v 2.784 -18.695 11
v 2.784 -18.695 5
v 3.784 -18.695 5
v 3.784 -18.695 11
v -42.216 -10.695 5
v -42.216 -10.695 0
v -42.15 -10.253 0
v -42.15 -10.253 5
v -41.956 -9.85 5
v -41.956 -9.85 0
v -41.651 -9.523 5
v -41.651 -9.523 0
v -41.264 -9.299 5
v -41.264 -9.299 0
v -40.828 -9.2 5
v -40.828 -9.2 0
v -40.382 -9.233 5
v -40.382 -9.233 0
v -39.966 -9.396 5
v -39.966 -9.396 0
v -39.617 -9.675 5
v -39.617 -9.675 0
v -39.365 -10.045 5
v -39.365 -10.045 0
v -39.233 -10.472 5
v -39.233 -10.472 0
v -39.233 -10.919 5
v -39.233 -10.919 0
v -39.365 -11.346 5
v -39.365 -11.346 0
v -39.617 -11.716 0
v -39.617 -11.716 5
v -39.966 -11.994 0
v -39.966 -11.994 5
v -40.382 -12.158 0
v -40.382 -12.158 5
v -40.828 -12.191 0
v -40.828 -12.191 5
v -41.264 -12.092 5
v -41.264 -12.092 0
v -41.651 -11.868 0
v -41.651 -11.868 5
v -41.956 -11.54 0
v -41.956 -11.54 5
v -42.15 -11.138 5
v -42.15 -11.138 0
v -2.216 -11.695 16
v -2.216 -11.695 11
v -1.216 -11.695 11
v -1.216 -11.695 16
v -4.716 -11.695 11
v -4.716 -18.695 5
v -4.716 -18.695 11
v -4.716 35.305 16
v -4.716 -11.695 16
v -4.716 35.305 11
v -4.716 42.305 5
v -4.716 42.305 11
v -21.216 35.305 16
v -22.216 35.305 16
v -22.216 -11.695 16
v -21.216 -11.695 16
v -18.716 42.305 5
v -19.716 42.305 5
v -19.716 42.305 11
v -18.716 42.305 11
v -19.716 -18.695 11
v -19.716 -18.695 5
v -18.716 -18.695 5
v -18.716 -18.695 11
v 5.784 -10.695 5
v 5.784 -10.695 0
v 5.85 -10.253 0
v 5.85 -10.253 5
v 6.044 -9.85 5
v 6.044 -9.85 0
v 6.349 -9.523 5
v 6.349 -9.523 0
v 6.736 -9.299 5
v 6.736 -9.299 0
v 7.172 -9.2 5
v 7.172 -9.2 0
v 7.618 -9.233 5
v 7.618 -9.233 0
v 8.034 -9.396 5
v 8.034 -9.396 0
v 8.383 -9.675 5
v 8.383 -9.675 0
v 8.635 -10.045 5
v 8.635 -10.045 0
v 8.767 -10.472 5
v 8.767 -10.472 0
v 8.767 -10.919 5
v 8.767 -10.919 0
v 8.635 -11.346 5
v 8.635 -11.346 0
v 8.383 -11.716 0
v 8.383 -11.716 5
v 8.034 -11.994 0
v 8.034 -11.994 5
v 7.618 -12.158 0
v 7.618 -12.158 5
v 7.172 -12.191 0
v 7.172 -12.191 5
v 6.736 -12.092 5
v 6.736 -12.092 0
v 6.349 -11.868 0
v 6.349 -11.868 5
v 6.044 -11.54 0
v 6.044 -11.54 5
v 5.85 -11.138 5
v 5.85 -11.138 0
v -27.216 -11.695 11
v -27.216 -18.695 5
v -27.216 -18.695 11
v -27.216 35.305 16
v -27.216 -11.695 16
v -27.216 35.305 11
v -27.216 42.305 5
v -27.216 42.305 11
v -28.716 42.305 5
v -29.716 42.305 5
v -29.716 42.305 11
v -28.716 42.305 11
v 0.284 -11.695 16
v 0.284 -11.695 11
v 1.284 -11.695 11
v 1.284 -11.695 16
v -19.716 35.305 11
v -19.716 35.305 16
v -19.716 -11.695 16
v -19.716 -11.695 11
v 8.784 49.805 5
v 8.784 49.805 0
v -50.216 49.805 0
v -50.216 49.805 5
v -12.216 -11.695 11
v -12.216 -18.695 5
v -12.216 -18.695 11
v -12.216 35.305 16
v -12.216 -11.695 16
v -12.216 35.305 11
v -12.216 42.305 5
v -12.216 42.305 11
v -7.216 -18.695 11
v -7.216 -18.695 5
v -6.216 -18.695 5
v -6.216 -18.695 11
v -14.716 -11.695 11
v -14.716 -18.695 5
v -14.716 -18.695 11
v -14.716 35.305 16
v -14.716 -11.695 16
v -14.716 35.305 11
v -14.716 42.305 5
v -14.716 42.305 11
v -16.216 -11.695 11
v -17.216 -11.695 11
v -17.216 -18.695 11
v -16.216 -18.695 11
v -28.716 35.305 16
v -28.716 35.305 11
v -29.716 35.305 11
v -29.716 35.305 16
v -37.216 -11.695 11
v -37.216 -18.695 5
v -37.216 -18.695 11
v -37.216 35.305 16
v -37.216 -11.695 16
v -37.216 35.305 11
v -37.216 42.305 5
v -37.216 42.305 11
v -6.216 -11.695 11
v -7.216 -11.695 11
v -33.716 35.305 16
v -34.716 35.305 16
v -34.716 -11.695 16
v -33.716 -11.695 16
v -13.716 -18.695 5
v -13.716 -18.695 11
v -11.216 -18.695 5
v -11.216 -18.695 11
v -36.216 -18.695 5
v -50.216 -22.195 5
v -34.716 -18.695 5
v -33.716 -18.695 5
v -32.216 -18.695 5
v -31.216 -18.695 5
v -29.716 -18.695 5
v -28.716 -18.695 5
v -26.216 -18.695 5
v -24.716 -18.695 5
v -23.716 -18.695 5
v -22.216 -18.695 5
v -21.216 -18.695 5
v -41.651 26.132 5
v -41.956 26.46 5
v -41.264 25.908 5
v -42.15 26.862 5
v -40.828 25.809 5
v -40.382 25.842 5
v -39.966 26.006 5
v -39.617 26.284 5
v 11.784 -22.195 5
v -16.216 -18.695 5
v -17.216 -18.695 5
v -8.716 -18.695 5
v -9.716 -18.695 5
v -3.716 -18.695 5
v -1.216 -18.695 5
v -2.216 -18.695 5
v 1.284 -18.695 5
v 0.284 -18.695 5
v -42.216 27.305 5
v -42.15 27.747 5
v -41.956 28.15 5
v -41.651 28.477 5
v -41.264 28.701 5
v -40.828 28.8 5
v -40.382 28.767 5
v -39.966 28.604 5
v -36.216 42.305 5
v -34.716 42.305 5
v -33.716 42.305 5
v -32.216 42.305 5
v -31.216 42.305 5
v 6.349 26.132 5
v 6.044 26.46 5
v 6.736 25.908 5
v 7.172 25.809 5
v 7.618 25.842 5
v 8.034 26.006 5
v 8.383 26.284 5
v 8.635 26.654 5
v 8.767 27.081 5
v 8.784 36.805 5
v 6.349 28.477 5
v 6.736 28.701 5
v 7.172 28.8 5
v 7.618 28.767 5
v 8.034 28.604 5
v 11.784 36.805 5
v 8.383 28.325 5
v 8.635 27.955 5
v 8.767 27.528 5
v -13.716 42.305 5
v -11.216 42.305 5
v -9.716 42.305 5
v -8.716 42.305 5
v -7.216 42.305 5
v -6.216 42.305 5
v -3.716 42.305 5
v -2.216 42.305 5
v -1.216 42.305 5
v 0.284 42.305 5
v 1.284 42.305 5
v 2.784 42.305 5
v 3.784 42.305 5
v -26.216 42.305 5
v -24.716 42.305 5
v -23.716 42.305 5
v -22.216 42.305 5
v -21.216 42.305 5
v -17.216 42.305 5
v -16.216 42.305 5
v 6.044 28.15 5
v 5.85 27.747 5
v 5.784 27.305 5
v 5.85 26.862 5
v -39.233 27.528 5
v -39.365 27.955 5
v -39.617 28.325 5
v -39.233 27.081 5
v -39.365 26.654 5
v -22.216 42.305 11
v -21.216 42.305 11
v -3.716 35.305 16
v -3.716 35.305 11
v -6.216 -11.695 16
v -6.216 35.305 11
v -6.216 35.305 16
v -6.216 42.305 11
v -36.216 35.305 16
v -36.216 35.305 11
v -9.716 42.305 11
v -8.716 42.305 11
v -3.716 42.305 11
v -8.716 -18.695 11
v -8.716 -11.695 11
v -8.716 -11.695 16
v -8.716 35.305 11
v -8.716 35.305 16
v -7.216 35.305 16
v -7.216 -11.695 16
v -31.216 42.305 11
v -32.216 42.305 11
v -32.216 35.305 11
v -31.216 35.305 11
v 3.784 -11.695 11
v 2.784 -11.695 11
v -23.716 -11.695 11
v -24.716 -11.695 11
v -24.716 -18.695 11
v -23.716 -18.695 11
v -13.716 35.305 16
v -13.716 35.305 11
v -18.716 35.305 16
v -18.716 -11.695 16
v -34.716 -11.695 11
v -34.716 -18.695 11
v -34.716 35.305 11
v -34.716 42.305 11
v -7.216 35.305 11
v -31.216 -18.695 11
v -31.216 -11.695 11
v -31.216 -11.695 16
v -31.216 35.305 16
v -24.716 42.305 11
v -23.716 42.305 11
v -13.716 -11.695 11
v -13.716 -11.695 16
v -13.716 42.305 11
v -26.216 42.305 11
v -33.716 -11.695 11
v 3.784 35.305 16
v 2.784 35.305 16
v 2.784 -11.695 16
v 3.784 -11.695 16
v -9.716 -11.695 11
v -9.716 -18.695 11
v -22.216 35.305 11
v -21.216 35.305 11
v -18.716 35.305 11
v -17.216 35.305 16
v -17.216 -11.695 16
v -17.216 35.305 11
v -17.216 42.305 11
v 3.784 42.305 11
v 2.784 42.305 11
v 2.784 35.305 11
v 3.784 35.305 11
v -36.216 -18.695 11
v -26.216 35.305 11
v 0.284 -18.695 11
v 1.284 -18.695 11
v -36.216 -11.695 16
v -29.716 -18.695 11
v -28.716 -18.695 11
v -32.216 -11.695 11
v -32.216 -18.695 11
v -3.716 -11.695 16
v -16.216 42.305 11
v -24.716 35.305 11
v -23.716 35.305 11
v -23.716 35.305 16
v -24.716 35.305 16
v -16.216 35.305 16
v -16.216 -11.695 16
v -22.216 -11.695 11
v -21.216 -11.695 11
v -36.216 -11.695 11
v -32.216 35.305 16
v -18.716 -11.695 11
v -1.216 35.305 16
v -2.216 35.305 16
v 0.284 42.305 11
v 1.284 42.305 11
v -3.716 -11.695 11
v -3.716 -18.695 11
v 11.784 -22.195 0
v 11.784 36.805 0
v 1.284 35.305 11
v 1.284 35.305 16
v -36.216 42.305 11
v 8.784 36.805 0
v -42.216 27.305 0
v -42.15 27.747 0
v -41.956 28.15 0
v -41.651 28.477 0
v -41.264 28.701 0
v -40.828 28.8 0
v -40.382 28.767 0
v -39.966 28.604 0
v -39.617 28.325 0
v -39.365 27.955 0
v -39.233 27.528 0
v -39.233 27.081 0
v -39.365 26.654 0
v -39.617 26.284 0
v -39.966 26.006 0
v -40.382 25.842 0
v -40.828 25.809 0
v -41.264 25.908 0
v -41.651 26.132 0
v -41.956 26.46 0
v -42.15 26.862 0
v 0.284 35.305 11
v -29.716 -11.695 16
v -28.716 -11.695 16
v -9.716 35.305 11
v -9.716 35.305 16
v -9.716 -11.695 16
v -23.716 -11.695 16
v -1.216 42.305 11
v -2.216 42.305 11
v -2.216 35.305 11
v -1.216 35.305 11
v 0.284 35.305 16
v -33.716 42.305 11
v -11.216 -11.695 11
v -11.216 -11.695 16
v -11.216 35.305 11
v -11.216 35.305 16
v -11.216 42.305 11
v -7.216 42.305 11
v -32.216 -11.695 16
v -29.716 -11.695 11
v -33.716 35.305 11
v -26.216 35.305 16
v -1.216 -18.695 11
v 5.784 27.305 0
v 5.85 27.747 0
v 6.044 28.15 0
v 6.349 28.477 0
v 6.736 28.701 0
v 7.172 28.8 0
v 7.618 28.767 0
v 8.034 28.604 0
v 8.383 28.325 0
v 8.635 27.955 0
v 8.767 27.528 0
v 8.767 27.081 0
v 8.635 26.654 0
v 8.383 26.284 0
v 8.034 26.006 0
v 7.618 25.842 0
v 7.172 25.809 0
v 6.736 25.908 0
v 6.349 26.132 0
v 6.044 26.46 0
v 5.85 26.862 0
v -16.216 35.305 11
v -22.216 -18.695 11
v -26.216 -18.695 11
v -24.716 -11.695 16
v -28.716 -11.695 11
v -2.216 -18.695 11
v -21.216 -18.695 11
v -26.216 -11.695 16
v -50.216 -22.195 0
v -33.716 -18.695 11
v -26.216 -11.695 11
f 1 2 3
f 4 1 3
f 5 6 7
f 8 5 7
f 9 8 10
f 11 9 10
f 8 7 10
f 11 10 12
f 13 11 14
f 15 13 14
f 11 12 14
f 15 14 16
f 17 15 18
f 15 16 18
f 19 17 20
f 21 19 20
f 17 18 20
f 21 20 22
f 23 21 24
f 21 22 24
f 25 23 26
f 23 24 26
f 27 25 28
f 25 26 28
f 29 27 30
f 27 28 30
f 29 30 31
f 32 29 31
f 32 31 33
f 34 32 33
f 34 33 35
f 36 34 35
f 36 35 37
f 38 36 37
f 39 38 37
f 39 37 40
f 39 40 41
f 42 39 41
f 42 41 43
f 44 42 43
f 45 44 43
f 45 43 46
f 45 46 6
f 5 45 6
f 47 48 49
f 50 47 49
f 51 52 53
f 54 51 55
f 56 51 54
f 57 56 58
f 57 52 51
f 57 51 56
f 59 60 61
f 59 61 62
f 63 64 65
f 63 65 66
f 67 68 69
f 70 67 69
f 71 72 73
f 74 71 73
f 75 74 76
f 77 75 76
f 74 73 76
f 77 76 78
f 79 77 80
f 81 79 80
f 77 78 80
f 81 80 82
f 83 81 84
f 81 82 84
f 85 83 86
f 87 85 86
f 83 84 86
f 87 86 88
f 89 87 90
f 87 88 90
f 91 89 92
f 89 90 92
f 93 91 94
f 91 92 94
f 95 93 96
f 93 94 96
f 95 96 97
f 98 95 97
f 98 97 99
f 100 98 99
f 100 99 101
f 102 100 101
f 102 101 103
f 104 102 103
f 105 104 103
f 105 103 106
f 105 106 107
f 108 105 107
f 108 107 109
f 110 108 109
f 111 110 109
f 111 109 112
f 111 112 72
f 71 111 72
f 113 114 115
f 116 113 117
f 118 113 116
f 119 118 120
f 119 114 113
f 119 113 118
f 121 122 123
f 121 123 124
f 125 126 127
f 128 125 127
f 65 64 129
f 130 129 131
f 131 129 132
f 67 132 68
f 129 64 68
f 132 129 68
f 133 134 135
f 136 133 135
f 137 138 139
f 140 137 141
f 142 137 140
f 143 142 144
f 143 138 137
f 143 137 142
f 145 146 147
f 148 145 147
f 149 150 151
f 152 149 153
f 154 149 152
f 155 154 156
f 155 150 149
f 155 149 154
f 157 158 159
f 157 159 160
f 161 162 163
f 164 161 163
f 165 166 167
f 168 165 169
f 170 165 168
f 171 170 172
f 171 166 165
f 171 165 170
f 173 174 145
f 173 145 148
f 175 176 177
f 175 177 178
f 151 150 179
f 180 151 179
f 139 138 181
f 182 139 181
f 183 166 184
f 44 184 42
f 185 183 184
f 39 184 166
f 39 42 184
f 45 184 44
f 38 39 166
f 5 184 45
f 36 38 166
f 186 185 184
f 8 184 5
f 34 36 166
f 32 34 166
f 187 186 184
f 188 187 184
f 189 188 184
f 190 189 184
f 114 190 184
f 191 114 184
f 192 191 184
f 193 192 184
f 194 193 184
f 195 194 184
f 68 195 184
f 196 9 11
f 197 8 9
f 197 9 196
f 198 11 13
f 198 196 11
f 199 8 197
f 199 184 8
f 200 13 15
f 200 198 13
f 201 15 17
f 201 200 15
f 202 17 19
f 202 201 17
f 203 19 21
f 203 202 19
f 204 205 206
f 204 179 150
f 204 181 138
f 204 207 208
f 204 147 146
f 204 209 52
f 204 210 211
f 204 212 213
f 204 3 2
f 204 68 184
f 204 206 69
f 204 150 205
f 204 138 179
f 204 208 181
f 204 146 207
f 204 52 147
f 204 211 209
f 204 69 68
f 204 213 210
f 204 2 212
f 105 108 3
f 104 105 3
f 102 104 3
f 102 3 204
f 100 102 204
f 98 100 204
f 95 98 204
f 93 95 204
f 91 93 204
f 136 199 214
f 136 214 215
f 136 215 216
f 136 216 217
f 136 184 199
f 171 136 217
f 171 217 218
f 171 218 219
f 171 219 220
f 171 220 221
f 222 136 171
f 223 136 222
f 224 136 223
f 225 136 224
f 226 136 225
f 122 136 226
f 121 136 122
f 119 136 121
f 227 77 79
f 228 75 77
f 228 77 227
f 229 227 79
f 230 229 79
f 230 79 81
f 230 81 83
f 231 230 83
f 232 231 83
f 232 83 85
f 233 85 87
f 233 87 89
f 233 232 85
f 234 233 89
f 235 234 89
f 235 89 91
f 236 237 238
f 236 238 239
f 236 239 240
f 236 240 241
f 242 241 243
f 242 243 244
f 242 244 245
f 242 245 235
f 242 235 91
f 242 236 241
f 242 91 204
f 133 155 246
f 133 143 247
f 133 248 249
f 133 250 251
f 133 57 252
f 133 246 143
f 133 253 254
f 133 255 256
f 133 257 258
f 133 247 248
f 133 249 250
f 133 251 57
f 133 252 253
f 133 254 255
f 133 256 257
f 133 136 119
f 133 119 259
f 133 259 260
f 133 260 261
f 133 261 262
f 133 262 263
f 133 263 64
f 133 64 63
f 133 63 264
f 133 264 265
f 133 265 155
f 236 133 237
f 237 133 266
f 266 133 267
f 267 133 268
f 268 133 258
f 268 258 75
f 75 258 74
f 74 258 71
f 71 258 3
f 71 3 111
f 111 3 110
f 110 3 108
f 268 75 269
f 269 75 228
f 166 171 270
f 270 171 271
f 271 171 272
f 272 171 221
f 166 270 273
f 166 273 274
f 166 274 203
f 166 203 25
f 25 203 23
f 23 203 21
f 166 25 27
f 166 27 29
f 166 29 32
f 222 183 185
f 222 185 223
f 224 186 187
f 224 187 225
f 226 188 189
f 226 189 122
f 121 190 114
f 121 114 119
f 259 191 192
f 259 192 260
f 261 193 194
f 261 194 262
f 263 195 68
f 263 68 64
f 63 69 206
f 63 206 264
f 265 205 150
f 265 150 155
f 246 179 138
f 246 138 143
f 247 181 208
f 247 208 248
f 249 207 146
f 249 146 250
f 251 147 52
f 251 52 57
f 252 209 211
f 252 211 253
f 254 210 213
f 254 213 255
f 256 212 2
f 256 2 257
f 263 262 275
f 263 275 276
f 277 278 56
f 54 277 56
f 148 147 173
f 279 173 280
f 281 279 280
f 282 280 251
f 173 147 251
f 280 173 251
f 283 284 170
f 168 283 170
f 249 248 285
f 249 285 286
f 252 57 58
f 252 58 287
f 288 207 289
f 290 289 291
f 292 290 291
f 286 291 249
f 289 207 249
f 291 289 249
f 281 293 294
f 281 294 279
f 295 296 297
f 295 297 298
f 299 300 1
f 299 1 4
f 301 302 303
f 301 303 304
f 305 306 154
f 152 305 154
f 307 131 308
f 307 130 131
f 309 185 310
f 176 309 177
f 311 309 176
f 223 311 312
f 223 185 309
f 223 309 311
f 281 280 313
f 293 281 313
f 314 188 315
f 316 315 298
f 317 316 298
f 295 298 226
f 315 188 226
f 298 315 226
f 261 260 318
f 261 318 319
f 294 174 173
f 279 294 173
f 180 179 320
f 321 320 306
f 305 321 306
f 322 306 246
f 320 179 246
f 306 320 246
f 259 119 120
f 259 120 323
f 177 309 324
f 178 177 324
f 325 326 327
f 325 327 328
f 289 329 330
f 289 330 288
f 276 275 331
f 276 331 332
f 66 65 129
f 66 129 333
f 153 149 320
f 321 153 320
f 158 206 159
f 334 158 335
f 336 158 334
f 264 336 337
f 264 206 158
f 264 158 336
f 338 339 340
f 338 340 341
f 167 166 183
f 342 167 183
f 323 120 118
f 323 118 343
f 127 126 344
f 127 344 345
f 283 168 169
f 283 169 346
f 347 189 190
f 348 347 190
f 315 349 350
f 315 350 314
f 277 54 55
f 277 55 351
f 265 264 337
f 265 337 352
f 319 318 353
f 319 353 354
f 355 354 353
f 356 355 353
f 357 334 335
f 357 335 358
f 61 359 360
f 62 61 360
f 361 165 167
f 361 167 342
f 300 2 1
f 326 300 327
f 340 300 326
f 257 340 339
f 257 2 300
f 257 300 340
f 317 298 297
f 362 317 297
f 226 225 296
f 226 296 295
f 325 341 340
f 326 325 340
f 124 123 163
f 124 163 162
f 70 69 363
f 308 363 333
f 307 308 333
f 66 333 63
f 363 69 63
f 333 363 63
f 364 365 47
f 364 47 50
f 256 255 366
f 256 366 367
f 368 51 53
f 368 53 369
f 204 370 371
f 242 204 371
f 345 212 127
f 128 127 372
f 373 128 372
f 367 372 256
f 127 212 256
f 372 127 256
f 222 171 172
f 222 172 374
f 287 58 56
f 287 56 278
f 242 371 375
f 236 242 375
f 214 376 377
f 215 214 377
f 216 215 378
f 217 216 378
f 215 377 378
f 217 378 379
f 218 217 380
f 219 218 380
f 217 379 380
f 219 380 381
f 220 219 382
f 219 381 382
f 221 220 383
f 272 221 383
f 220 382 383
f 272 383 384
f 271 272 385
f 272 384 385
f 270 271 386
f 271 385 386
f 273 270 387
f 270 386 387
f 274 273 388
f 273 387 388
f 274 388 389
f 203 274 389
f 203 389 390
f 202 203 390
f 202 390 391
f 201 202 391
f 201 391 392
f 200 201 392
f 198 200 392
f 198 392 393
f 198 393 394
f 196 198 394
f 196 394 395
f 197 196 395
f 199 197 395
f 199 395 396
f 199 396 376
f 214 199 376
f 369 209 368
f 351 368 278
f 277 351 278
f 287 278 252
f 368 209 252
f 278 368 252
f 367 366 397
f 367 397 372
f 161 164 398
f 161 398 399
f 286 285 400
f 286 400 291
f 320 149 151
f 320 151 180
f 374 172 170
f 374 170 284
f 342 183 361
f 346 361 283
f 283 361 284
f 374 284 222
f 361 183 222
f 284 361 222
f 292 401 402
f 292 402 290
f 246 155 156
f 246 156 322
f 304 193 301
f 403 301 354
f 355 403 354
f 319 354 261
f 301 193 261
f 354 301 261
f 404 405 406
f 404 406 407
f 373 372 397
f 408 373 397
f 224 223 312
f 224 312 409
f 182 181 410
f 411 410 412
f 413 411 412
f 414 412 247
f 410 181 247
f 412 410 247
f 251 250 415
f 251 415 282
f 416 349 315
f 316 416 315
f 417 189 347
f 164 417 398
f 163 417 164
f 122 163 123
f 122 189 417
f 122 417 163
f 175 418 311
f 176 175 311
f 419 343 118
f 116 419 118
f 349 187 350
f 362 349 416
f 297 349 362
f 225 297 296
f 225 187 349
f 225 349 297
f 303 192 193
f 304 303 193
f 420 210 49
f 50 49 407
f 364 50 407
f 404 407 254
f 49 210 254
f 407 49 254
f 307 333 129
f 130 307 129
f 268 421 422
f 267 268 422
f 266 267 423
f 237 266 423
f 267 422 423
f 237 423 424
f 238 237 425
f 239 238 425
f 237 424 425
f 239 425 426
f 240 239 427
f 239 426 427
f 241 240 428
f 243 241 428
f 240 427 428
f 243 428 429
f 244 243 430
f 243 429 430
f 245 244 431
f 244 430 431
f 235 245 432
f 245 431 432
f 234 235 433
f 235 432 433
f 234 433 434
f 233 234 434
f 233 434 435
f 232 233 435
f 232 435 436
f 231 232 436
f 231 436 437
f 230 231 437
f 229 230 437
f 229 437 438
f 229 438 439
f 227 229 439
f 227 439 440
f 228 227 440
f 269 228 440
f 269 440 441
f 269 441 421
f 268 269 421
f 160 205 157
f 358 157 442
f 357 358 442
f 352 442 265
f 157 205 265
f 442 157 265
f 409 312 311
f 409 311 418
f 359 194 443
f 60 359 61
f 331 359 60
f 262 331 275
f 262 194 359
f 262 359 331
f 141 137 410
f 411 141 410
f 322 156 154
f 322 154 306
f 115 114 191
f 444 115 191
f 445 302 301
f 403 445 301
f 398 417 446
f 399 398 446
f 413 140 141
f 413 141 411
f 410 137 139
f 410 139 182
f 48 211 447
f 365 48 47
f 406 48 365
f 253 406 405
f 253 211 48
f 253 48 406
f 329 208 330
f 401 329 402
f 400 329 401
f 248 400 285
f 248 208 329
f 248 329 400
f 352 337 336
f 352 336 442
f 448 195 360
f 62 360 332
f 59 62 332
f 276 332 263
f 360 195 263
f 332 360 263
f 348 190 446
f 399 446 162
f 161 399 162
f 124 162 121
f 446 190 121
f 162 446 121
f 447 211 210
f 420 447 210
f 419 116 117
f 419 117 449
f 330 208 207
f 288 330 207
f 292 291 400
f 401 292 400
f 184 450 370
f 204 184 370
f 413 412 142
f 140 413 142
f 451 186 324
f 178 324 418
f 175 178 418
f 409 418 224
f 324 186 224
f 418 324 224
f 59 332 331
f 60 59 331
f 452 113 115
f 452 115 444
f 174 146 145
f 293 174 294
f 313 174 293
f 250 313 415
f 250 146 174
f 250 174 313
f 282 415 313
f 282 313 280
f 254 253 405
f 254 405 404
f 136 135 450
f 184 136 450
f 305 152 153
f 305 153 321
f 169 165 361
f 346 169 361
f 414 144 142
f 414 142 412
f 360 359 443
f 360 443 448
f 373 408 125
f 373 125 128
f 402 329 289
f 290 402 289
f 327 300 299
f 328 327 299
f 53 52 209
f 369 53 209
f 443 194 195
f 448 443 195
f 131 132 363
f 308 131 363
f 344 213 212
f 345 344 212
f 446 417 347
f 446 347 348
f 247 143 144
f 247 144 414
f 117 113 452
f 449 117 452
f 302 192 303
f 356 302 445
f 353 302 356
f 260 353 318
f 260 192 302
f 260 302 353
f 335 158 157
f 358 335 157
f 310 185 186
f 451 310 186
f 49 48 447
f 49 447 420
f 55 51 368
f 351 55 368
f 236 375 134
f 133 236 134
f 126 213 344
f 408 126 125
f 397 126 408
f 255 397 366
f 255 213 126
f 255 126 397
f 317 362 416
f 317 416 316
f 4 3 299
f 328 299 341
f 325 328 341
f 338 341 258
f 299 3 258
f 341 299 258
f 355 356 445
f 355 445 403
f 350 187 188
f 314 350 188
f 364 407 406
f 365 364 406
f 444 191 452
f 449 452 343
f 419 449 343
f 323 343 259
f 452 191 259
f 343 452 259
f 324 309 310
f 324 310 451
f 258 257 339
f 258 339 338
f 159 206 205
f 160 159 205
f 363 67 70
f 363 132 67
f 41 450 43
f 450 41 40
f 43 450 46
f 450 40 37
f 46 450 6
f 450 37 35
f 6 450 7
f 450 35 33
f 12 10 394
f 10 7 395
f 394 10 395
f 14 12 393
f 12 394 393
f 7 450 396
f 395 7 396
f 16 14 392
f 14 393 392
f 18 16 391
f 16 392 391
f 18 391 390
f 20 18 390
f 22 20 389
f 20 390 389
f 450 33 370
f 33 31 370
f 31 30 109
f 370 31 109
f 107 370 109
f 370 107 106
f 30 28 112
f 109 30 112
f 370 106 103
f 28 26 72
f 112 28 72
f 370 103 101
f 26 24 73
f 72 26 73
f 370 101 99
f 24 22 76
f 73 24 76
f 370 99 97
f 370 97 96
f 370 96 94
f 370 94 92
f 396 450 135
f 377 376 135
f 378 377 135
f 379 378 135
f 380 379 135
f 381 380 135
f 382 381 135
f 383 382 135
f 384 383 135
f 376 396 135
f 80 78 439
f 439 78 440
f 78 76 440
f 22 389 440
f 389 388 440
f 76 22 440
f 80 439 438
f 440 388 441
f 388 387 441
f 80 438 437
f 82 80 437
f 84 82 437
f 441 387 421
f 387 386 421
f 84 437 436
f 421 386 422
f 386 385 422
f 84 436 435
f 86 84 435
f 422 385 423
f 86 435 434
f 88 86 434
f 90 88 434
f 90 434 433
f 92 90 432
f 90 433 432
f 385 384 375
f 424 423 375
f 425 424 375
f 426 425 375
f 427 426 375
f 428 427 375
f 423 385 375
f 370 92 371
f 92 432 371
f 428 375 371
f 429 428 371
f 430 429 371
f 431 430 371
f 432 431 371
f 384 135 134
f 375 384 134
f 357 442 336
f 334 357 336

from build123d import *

# Parameters (mm, degrees)
F1_DEPTH = 5
F3_DEPTH = 11
F2_W     = 1
F2_H     = 7
F4_DEPTH = 6
F5_D     = 3


with BuildPart() as f1:
    # F0 (on Top) → F1 (new body)
    with BuildSketch(Plane.XY):
        Polygon((8.783761, 49.804577), (-50.216239, 49.804577), (-50.216239, -22.195423), (11.783761, -22.195423), (11.783761, 36.804577), (8.783761, 36.804577), align=None)
    extrude(amount=F1_DEPTH)

    # F2 (on face) → F3 (join)
    with BuildSketch(Plane.XY.offset(5)):
        Polygon((-37.216239, 35.304577), (-37.216239, 13.804577), (-37.216239, -11.695423), (-36.216239, -11.695423), (-36.216239, 35.304577), align=None)
        Polygon((-33.716239, -11.695423), (-33.716239, 35.304577), (-34.716239, 35.304577), (-34.716239, 13.804577), (-34.716239, -11.695423), align=None)
        Polygon((-31.216239, -11.695423), (-31.216239, 35.304577), (-32.216239, 35.304577), (-32.216239, 13.804577), (-32.216239, -11.695423), align=None)
        Polygon((-28.716239, -11.695423), (-28.716239, 35.304577), (-29.716239, 35.304577), (-29.716239, 13.804577), (-29.716239, -11.695423), align=None)
        Polygon((-26.216239, -11.695423), (-26.216239, 35.304577), (-27.216239, 35.304577), (-27.216239, 13.804577), (-27.216239, -11.695423), align=None)
        Polygon((-23.716239, -11.695423), (-23.716239, 35.304577), (-24.716239, 35.304577), (-24.716239, 13.804577), (-24.716239, -11.695423), align=None)
        Polygon((-21.216239, -11.695423), (-21.216239, 35.304577), (-22.216239, 35.304577), (-22.216239, 13.804577), (-22.216239, -11.695423), align=None)
        Polygon((-19.716239, -11.695423), (-18.716239, -11.695423), (-18.716239, 35.304577), (-19.716239, 35.304577), (-19.716239, 13.804577), align=None)
        Polygon((-16.216239, -11.695423), (-16.216239, 35.304577), (-17.216239, 35.304577), (-17.216239, 13.804577), (-17.216239, -11.695423), align=None)
        Polygon((-13.716239, -11.695423), (-13.716239, 35.304577), (-14.716239, 35.304577), (-14.716239, 13.804577), (-14.716239, -11.695423), align=None)
        Polygon((-11.216239, -11.695423), (-11.216239, 35.304577), (-12.216239, 35.304577), (-12.216239, 13.804577), (-12.216239, -11.695423), align=None)
        Polygon((-8.716239, -11.695423), (-8.716239, 35.304577), (-9.716239, 35.304577), (-9.716239, 13.804577), (-9.716239, -11.695423), align=None)
        Polygon((-6.216239, -11.695423), (-6.216239, 35.304577), (-7.216239, 35.304577), (-7.216239, 13.804577), (-7.216239, -11.695423), align=None)
        Polygon((-3.716239, -11.695423), (-3.716239, 35.304577), (-4.716239, 35.304577), (-4.716239, 13.804577), (-4.716239, -11.695423), align=None)
        Polygon((-1.216239, -11.695423), (-1.216239, 35.304577), (-2.216239, 35.304577), (-2.216239, 13.804577), (-2.216239, -11.695423), align=None)
        Polygon((1.283761, -11.695423), (1.283761, 35.304577), (0.283761, 35.304577), (0.283761, 13.804577), (0.283761, -11.695423), align=None)
        Polygon((3.783761, -11.695423), (3.783761, 35.304577), (2.783761, 35.304577), (2.783761, 13.804577), (2.783761, -11.695423), align=None)
    extrude(amount=F3_DEPTH)

    # F2 (on face) → F4 (join)
    with BuildSketch(Plane.XY.offset(5)):
        with Locations((-36.716239, 38.804577)):
            Rectangle(F2_W, F2_H)
        with Locations((-34.216239, 38.804577)):
            Rectangle(F2_W, F2_H)
        with Locations((-31.716239, 38.804577)):
            Rectangle(F2_W, F2_H)
        with Locations((-29.216239, 38.804577)):
            Rectangle(F2_W, F2_H)
        with Locations((-26.716239, 38.804577)):
            Rectangle(F2_W, F2_H)
        with Locations((-24.216239, 38.804577)):
            Rectangle(F2_W, F2_H)
        with Locations((-21.716239, 38.804577)):
            Rectangle(F2_W, F2_H)
        with Locations((-19.216239, 38.804577)):
            Rectangle(F2_W, F2_H)
        with Locations((-16.716239, 38.804577)):
            Rectangle(F2_W, F2_H)
        with Locations((-14.216239, 38.804577)):
            Rectangle(F2_W, F2_H)
        with Locations((-11.716239, 38.804577)):
            Rectangle(F2_W, F2_H)
        with Locations((-9.216239, 38.804577)):
            Rectangle(F2_W, F2_H)
        with Locations((-6.716239, 38.804577)):
            Rectangle(F2_W, F2_H)
        with Locations((-4.216239, 38.804577)):
            Rectangle(F2_W, F2_H)
        with Locations((-1.716239, 38.804577)):
            Rectangle(F2_W, F2_H)
        with Locations((0.783761, 38.804577)):
            Rectangle(F2_W, F2_H)
        with Locations((3.283761, 38.804577)):
            Rectangle(F2_W, F2_H)
        with Locations((3.283761, -15.195423)):
            Rectangle(F2_W, F2_H)
        with Locations((0.783761, -15.195423)):
            Rectangle(F2_W, F2_H)
        with Locations((-1.716239, -15.195423)):
            Rectangle(F2_W, F2_H)
        with Locations((-4.216239, -15.195423)):
            Rectangle(F2_W, F2_H)
        with Locations((-6.716239, -15.195423)):
            Rectangle(F2_W, F2_H)
        with Locations((-9.216239, -15.195423)):
            Rectangle(F2_W, F2_H)
        with Locations((-11.716239, -15.195423)):
            Rectangle(F2_W, F2_H)
        with Locations((-14.216239, -15.195423)):
            Rectangle(F2_W, F2_H)
        with Locations((-16.716239, -15.195423)):
            Rectangle(F2_W, F2_H)
        Polygon((-19.716239, -18.695423), (-19.216239, -18.695423), (-18.716239, -18.695423), (-18.716239, -11.695423), (-19.716239, -11.695423), align=None)
        with Locations((-21.716239, -15.195423)):
            Rectangle(F2_W, F2_H)
        with Locations((-24.216239, -15.195423)):
            Rectangle(F2_W, F2_H)
        with Locations((-26.716239, -15.195423)):
            Rectangle(F2_W, F2_H)
        with Locations((-29.216239, -15.195423)):
            Rectangle(F2_W, F2_H)
        with Locations((-31.716239, -15.195423)):
            Rectangle(F2_W, F2_H)
        with Locations((-34.216239, -15.195423)):
            Rectangle(F2_W, F2_H)
        with Locations((-36.716239, -15.195423)):
            Rectangle(F2_W, F2_H)
    extrude(amount=F4_DEPTH)

    # F5 (through all)
    with Locations(Plane.XY.offset(5)):
        with Locations((-40.716239, 27.304577), (7.283761, 27.304577), (7.283761, -10.695423), (-40.716239, -10.695423)):
            Hole(F5_D / 2)


solid = f1.part
